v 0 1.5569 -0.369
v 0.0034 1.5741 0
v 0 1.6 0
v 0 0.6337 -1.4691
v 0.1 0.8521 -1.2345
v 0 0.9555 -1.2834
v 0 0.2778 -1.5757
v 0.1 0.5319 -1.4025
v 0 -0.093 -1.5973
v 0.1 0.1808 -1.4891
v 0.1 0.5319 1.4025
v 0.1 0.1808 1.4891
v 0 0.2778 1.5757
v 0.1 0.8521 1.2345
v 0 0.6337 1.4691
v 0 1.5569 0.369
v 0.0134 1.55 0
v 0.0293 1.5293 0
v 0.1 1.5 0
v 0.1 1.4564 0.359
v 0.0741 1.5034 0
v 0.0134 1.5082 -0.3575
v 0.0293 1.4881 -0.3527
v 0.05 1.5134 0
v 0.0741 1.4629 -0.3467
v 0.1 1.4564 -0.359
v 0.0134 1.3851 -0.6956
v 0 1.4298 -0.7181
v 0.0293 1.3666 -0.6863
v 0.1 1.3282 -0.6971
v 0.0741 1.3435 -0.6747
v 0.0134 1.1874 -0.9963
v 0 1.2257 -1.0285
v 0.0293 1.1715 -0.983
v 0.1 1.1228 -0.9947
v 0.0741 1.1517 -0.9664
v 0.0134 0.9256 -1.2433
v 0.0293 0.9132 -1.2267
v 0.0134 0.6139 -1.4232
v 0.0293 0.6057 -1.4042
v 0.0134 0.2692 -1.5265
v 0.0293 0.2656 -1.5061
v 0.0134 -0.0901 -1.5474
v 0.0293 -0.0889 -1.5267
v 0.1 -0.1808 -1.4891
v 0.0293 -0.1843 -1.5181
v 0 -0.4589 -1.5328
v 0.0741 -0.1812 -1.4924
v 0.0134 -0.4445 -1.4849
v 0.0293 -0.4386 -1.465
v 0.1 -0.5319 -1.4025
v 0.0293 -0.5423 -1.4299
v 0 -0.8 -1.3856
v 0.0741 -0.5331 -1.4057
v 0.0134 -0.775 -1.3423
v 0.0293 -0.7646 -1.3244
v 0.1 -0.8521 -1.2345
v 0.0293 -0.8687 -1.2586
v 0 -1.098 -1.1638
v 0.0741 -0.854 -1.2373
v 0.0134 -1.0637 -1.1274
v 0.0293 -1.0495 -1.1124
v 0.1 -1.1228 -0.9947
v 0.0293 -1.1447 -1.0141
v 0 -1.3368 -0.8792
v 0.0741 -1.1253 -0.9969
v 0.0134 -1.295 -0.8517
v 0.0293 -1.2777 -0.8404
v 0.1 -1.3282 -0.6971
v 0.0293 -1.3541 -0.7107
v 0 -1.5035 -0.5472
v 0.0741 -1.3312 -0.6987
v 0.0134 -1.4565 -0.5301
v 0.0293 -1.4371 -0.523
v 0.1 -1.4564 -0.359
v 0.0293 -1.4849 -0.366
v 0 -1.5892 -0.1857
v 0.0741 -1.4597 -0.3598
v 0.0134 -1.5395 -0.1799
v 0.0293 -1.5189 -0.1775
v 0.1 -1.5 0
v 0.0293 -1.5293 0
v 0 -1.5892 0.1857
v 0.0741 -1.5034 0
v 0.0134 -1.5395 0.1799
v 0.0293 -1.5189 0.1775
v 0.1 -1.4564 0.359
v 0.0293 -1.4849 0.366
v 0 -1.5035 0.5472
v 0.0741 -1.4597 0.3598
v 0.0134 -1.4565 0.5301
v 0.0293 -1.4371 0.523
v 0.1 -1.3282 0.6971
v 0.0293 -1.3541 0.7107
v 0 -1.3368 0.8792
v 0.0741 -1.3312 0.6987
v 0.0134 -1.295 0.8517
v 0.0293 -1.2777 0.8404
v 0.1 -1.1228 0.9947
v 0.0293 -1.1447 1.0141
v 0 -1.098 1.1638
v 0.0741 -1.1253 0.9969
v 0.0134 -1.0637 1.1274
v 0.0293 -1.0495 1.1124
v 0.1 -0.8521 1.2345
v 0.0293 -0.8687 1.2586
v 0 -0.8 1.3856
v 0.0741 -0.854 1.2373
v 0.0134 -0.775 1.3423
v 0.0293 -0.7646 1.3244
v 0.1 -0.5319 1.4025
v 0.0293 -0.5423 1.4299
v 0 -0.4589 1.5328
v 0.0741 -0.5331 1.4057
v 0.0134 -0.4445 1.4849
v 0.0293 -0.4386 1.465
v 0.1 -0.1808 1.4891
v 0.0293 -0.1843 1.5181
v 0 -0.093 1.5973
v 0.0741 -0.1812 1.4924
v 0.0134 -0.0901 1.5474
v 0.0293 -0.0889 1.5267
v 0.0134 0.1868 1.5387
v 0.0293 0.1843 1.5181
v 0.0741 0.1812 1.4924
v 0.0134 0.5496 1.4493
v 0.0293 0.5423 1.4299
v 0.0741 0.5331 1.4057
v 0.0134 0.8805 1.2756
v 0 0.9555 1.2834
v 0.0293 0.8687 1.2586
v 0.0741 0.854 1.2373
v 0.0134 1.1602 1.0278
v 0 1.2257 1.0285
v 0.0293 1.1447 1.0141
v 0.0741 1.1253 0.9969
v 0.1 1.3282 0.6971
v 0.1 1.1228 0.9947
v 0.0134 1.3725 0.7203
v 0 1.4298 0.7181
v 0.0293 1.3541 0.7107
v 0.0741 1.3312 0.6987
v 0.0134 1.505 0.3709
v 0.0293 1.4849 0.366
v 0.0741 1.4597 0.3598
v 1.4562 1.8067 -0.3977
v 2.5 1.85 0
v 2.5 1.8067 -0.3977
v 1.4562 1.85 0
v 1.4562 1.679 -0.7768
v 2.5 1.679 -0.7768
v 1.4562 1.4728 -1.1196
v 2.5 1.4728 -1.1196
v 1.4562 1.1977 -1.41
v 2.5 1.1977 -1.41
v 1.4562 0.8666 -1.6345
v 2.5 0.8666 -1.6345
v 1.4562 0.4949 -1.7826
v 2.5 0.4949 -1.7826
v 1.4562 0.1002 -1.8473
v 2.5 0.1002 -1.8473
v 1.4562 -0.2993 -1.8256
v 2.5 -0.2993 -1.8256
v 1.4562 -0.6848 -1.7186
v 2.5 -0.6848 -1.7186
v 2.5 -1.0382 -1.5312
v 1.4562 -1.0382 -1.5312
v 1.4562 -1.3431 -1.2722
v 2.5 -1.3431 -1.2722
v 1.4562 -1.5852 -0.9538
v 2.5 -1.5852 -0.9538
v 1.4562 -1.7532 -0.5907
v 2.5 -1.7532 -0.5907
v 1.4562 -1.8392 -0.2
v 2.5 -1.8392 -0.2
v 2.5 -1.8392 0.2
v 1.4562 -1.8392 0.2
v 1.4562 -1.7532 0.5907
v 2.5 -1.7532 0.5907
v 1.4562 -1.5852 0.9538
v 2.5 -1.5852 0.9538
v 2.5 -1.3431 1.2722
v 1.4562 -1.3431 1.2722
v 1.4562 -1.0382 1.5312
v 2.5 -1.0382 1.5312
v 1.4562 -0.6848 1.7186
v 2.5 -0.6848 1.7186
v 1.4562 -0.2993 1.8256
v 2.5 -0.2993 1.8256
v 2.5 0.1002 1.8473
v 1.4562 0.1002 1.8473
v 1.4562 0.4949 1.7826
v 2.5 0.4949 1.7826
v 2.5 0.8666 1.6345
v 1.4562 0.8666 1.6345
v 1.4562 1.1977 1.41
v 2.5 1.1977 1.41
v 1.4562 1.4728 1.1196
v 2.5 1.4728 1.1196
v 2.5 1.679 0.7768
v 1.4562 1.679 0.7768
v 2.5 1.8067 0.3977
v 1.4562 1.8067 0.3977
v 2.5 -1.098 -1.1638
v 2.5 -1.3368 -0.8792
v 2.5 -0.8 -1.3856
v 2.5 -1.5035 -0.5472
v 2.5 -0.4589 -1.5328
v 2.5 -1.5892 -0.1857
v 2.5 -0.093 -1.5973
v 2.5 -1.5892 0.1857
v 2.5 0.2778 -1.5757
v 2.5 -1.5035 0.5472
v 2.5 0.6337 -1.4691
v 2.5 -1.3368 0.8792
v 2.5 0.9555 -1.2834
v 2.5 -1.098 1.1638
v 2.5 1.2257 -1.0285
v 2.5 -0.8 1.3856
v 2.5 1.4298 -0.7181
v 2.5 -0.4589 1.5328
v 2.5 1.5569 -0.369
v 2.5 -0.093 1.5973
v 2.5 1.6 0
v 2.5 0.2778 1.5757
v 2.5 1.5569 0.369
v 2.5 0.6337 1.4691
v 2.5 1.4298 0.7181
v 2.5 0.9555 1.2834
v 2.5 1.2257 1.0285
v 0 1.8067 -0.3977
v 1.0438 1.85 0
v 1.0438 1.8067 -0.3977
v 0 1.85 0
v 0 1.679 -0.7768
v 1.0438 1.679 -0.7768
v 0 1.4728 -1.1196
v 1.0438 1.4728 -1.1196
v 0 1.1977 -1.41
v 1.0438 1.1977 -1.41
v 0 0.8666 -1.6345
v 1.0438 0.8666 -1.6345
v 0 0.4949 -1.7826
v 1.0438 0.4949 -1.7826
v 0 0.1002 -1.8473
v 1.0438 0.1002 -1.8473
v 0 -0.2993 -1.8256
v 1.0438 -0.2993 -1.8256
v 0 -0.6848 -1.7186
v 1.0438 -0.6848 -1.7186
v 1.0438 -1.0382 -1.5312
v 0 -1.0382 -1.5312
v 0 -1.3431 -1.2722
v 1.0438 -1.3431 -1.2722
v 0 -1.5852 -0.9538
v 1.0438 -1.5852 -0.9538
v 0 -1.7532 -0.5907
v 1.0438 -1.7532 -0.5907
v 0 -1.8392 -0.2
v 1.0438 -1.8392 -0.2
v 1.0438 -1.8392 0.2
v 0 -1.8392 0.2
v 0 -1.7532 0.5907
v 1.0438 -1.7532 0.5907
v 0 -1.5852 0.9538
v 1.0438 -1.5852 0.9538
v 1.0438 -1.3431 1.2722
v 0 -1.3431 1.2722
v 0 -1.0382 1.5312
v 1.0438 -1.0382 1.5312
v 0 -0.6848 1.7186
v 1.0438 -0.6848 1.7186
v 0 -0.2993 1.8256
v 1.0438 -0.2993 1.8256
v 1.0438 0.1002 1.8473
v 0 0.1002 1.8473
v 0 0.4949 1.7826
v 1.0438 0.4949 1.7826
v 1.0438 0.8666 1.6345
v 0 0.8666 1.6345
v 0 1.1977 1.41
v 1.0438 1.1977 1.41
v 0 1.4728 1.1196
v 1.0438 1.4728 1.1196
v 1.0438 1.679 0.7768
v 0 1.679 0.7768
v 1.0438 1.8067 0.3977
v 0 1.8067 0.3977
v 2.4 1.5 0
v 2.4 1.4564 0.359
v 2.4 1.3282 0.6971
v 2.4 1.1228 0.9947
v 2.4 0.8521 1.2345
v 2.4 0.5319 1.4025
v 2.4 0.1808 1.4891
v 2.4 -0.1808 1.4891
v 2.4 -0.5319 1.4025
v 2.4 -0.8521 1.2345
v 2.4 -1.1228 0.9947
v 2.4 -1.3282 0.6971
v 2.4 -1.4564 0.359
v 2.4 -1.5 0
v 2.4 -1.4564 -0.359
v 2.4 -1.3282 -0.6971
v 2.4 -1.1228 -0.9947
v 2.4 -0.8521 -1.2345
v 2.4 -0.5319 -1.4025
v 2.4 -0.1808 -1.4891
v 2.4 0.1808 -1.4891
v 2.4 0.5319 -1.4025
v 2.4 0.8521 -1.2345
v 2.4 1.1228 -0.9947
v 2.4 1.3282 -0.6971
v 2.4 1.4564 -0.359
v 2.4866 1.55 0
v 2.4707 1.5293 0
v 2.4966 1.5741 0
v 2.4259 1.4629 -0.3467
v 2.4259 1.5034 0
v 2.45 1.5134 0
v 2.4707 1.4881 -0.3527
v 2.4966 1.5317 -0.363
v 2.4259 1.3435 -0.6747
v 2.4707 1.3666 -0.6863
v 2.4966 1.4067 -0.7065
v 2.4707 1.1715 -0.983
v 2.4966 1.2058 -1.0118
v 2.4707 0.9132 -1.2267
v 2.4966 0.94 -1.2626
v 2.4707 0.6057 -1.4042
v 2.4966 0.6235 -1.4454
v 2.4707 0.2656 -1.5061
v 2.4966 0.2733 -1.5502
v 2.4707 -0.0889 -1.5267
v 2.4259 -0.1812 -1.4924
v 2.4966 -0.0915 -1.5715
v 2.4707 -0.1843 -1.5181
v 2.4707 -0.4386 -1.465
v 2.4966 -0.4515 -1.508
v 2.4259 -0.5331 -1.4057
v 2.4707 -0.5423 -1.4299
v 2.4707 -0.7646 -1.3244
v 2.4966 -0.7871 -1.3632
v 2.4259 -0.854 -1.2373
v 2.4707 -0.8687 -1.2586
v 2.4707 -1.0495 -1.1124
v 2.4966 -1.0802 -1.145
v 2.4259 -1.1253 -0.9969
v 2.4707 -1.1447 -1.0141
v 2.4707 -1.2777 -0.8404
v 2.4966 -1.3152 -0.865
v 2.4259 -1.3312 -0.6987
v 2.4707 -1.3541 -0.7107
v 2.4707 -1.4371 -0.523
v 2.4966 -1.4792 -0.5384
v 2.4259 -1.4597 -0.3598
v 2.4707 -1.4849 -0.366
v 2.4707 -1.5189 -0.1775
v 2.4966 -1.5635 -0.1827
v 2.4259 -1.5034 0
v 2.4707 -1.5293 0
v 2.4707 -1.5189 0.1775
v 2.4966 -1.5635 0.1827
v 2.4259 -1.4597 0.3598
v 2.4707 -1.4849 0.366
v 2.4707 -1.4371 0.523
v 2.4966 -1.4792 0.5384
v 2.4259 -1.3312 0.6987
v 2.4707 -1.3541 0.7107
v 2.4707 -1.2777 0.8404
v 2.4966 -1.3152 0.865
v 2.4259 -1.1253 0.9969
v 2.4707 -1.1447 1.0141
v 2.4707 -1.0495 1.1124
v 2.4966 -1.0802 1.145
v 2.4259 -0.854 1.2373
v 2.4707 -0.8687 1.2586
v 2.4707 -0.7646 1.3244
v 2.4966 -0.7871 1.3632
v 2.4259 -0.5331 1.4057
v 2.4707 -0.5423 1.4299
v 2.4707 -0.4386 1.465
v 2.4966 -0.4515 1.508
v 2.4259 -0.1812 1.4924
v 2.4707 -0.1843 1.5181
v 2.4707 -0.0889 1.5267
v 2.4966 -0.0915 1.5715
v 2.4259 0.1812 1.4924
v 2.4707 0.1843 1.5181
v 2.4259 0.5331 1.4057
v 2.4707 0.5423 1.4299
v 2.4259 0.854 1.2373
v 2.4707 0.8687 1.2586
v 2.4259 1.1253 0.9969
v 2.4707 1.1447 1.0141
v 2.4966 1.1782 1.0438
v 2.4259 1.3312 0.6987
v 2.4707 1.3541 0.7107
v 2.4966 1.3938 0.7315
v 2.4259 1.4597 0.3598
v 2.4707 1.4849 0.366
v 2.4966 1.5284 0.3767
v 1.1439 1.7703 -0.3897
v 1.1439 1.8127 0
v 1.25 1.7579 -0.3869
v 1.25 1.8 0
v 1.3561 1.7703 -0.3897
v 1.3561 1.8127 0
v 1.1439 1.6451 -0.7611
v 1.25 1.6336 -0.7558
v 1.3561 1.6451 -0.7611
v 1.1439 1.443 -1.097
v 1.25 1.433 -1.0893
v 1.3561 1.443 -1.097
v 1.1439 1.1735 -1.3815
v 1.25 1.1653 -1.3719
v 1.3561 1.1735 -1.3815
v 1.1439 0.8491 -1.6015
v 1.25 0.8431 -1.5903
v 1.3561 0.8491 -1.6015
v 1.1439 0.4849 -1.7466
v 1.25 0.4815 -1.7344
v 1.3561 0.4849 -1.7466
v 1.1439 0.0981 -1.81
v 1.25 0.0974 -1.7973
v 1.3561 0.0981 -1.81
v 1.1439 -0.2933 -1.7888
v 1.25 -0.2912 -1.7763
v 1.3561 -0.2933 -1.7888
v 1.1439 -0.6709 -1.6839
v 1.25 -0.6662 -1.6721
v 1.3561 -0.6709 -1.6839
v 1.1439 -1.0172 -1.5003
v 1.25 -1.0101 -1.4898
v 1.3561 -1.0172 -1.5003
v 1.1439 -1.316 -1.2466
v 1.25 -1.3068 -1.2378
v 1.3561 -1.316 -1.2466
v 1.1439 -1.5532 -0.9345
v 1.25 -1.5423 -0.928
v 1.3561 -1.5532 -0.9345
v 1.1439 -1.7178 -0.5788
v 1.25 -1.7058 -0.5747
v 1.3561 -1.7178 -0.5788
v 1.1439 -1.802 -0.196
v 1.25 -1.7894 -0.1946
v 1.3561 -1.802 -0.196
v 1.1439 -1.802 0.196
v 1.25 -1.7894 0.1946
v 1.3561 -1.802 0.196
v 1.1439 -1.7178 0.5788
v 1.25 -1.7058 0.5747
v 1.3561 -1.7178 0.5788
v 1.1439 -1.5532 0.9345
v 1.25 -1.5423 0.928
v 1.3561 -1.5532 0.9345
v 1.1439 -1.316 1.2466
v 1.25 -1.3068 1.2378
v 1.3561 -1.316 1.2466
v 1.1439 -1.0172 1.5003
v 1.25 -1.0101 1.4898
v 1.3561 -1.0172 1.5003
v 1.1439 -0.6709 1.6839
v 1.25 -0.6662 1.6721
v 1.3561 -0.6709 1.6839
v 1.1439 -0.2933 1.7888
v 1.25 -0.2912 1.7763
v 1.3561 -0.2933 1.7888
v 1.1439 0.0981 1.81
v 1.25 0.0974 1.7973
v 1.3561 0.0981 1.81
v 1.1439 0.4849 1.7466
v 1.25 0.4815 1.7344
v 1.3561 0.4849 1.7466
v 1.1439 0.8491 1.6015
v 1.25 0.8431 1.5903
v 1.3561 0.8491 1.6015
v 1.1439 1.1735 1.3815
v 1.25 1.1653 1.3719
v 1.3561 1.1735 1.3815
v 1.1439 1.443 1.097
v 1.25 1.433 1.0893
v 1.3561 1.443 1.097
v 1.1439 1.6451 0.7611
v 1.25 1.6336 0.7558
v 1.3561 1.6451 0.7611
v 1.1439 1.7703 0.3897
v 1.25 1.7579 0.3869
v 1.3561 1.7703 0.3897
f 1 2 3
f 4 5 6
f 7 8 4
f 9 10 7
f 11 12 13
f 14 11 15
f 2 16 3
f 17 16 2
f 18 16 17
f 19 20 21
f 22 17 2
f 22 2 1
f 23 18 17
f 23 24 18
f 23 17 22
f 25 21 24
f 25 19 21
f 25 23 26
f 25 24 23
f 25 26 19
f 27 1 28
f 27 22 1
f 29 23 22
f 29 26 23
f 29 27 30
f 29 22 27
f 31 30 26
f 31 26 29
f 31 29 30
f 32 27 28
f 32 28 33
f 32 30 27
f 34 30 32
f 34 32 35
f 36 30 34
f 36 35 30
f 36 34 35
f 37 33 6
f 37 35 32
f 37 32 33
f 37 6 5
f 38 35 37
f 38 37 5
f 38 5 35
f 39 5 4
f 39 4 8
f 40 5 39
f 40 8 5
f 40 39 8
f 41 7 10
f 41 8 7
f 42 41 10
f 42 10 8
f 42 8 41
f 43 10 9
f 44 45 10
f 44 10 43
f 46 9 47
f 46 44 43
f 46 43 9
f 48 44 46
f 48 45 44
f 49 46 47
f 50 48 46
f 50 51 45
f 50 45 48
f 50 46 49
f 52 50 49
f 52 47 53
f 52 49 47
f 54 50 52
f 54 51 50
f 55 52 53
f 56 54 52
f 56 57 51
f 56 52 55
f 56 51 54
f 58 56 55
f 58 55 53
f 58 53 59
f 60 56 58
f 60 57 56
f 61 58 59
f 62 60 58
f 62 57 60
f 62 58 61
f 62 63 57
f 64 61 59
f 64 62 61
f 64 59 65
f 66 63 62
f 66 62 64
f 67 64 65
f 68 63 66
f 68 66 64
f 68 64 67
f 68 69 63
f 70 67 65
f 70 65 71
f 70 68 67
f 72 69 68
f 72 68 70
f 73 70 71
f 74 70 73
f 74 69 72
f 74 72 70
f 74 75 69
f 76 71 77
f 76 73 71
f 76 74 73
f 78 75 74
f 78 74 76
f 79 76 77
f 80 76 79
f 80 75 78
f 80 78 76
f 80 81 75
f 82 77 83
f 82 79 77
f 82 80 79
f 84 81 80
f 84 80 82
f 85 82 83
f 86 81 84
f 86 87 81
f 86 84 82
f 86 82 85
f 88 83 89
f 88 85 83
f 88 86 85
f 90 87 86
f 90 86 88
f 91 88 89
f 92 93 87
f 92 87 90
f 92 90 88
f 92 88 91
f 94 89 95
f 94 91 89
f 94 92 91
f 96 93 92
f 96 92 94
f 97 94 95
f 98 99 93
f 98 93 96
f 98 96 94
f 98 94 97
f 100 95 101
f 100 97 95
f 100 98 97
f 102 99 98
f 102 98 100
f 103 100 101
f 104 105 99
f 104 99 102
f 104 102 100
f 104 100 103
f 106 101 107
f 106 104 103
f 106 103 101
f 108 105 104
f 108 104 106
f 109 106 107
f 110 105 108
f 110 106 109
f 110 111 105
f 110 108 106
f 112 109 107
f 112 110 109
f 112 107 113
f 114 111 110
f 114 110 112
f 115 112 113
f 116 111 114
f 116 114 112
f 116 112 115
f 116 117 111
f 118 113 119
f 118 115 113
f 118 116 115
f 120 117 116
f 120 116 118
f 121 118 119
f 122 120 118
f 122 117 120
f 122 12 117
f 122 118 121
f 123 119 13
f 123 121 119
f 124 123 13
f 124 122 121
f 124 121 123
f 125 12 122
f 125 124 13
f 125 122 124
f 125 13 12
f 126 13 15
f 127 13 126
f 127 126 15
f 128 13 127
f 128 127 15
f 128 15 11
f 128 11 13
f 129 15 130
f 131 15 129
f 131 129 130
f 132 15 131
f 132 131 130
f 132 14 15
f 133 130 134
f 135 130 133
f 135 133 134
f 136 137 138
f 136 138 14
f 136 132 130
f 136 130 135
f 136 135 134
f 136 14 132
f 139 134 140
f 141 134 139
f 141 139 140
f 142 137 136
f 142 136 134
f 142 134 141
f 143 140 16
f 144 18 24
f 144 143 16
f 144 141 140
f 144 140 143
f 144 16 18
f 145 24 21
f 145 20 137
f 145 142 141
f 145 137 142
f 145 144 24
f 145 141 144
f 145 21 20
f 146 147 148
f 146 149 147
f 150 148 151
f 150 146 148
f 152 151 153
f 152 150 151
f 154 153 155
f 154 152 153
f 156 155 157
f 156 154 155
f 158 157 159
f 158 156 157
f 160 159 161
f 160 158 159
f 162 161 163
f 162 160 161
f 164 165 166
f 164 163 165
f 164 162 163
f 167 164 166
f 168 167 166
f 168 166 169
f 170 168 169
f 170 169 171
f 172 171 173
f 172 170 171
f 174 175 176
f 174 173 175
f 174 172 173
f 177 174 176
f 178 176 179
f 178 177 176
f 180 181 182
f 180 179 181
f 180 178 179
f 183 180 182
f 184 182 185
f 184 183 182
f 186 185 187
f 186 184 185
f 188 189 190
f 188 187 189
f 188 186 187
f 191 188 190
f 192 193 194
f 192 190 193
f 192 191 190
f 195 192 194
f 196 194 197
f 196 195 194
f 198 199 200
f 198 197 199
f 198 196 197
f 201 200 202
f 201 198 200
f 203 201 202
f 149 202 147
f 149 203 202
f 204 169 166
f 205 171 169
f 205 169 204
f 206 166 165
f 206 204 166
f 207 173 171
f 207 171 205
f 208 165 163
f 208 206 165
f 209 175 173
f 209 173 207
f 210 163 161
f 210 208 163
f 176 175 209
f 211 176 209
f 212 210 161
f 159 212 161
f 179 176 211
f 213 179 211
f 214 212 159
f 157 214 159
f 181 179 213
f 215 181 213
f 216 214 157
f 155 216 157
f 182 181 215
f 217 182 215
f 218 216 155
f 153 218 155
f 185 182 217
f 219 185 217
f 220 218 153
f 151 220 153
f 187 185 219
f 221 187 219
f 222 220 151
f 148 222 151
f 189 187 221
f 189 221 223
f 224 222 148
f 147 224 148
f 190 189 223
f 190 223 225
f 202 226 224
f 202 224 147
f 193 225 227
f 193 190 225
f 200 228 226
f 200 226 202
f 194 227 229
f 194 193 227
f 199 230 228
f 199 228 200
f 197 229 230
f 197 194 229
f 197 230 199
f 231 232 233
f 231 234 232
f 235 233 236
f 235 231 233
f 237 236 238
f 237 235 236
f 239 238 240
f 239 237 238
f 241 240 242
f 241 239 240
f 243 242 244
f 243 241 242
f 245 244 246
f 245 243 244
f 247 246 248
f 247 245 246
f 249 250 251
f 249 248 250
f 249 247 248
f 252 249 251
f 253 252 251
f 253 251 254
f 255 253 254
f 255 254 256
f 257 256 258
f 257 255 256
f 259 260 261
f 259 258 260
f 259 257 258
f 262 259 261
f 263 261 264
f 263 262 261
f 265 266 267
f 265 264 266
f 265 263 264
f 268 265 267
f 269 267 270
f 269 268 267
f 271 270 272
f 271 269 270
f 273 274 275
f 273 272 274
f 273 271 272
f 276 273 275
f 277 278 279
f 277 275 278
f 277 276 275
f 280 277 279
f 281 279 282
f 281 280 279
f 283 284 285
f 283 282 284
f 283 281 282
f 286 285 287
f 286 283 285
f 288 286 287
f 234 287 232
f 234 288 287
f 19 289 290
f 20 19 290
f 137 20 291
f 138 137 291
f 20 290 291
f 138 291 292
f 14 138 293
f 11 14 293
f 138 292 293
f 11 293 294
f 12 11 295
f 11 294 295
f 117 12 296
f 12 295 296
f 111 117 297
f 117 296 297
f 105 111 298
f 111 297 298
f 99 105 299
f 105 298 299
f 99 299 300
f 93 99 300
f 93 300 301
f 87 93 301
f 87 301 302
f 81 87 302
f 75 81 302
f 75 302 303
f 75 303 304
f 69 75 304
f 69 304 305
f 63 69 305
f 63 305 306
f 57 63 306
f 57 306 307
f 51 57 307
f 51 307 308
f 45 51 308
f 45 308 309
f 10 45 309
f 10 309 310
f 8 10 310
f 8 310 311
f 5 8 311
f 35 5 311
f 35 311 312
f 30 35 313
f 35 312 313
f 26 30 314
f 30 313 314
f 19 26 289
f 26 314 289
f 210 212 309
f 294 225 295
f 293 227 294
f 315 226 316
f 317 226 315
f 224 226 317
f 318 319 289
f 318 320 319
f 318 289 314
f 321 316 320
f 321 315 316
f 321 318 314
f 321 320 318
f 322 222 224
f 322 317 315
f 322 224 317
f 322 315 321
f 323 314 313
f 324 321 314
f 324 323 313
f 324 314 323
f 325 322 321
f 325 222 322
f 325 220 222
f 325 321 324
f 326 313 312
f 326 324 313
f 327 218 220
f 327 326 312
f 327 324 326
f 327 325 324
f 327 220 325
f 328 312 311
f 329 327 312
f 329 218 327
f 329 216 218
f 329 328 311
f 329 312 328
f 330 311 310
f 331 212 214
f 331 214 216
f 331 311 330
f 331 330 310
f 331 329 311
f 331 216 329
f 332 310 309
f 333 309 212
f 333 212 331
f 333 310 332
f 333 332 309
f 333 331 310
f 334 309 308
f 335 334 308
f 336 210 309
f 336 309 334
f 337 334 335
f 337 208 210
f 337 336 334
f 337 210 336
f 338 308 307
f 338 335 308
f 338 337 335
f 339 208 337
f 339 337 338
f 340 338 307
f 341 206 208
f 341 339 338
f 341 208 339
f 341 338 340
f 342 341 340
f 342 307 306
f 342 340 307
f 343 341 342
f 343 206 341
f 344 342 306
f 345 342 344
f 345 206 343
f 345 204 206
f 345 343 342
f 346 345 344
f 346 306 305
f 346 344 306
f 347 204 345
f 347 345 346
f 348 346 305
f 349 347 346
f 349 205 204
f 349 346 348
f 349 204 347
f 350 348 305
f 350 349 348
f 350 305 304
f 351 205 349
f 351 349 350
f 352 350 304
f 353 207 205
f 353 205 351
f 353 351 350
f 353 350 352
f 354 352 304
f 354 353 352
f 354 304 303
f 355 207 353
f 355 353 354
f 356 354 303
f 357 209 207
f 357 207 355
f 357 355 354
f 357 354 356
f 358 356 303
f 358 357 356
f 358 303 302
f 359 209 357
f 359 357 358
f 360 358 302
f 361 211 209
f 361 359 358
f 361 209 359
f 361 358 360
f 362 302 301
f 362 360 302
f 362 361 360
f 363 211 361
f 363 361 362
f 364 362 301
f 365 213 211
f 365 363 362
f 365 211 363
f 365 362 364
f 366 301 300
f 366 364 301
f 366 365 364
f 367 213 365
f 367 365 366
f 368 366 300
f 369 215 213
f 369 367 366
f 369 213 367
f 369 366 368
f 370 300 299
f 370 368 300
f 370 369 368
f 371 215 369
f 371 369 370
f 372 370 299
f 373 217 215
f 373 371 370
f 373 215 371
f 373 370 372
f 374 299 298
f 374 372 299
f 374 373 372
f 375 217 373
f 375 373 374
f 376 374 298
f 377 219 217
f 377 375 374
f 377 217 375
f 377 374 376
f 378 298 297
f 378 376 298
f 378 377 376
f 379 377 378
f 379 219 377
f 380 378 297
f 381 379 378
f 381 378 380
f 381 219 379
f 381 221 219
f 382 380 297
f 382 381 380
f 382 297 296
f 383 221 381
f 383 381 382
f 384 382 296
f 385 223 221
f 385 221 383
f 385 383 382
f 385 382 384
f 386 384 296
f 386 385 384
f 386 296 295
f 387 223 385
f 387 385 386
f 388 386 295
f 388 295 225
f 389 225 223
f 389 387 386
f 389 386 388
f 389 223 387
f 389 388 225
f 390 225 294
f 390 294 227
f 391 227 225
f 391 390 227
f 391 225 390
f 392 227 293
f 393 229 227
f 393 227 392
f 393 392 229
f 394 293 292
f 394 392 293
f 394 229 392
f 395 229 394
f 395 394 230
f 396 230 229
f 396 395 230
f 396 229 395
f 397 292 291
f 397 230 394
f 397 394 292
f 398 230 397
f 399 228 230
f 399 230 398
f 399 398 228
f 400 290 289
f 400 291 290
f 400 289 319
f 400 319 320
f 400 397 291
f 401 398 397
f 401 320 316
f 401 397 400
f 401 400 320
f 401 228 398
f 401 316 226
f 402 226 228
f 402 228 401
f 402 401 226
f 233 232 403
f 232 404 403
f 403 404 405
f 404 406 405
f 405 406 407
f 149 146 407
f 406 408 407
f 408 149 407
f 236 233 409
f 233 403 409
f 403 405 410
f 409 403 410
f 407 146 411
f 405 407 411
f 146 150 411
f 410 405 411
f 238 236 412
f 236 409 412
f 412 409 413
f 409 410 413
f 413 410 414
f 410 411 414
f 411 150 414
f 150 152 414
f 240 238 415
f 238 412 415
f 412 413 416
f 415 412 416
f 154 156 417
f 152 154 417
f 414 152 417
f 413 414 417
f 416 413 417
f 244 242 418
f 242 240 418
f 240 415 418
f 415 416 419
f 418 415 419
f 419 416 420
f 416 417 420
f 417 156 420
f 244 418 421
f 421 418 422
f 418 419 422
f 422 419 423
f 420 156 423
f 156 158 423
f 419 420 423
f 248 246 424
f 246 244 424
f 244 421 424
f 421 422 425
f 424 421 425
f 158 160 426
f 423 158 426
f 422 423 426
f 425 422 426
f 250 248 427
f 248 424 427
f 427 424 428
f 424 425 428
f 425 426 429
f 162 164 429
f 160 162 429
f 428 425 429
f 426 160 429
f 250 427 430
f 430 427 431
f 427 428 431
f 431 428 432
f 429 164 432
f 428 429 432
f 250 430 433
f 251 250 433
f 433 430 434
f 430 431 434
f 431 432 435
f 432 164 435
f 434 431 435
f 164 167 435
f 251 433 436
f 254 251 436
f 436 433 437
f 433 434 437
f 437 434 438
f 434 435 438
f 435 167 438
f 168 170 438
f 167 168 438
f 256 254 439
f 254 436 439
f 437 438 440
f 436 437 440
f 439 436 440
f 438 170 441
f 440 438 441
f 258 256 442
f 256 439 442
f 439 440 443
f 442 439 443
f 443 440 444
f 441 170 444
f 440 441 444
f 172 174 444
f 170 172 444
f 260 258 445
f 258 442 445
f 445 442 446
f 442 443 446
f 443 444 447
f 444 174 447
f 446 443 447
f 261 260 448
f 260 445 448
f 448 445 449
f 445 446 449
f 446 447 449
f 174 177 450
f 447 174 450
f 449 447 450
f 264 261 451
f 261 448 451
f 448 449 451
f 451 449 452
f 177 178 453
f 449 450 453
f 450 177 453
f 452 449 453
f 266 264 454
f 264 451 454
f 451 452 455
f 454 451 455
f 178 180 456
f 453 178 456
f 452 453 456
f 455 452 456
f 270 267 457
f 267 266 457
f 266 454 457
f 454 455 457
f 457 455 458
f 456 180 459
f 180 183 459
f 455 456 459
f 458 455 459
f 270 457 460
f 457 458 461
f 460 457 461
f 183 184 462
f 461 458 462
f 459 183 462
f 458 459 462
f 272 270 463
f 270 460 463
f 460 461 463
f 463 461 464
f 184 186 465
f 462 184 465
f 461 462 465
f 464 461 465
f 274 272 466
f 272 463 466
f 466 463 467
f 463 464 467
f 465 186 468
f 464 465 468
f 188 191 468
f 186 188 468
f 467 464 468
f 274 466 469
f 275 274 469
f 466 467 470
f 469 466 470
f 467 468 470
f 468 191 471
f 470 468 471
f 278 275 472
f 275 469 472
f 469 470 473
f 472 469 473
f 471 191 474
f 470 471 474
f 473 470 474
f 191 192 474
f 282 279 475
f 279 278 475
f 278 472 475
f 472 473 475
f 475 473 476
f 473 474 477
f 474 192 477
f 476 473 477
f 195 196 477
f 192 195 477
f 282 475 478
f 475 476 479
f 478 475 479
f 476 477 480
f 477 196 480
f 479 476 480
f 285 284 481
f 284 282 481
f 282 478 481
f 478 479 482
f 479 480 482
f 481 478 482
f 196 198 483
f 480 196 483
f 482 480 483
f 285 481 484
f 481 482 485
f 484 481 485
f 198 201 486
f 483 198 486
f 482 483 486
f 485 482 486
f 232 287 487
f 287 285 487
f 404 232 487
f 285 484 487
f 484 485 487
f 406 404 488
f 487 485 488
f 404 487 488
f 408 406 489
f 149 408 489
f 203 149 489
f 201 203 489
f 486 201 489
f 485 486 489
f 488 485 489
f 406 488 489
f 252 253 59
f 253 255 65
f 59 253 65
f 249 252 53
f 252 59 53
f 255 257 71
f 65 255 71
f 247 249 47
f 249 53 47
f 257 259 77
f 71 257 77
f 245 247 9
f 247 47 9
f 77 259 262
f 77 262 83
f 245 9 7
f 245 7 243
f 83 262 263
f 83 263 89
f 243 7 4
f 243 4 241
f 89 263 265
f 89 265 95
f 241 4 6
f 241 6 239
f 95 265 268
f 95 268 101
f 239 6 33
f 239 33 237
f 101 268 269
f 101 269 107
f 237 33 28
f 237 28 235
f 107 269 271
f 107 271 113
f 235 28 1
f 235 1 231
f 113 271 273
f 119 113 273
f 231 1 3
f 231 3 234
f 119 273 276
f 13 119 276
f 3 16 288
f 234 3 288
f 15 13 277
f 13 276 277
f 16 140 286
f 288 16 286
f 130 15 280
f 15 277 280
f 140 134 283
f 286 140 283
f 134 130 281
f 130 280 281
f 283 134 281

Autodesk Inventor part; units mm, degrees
sketch "Sketch_1" plane through (0, 0, 0) normal (0, 0, 1) x (1, 0, 0)
  line L0 (2.5, 0) -> (0, 0)
  arc A0 (0, 1.6) -> (0.1, 1.5) centre (0.1, 1.6) ccw
  line L1 (0.1, 1.5) -> (2.4, 1.5)
  arc A1 (2.4, 1.5) -> (2.5, 1.6) centre (2.4, 1.6) ccw
  line L2 (2.5, 1.6) -> (2.5, 1.85)
  line L3 (2.5, 1.85) -> (1.4562, 1.85)
  arc A2 (1.0438, 1.85) -> (1.4562, 1.85) centre (1.25, 2.25) ccw
  line L4 (1.0438, 1.85) -> (0, 1.85)
  line L5 (0, 1.85) -> (0, 1.6)
revolve "Revolution1" add sketch "Sketch_1" angle 360 about axis through (2.5, 0, 0) along (1, 0, 0)
ref_plane "ip_st_1_1_XY" through (1.25, 2.25, 0) normal (1, 0, 0) x (0, 0, -1)
ref_plane "ip_st_1_1_YZ" through (1.25, 2.25, 0) normal (0, 0, -1) x (0, 1, 0)
ref_plane "ip_st_1_1_ZX" through (1.25, 2.25, 0) normal (0, 1, 0) x (1, 0, 0)
ref_plane "ip_st_1_10_XY" through (1.25, 0, -2.25) normal (1, 0, 0) x (0, 0, -1)
ref_plane "ip_st_1_10_YZ" through (1.25, 0, -2.25) normal (0, 0, -1) x (0, 1, 0)
ref_plane "ip_st_1_10_ZX" through (1.25, 0, -2.25) normal (0, 1, 0) x (1, 0, 0)
ref_plane "ip_st_1_11_XY" through (1.25, 1.125, -1.9486) normal (1, 0, 0) x (0, 0, -1)
ref_plane "ip_st_1_11_YZ" through (1.25, 1.125, -1.9486) normal (0, 0, -1) x (0, 1, 0)
ref_plane "ip_st_1_11_ZX" through (1.25, 1.125, -1.9486) normal (0, 1, 0) x (1, 0, 0)
ref_plane "ip_st_1_12_XY" through (1.25, 1.9486, -1.125) normal (1, 0, 0) x (0, 0, -1)
ref_plane "ip_st_1_12_YZ" through (1.25, 1.9486, -1.125) normal (0, 0, -1) x (0, 1, 0)
ref_plane "ip_st_1_12_ZX" through (1.25, 1.9486, -1.125) normal (0, 1, 0) x (1, 0, 0)
ref_plane "ip_st_1_2_XY" through (1.25, 1.9486, 1.125) normal (1, 0, 0) x (0, 0, -1)
ref_plane "ip_st_1_2_YZ" through (1.25, 1.9486, 1.125) normal (0, 0, -1) x (0, 1, 0)
ref_plane "ip_st_1_2_ZX" through (1.25, 1.9486, 1.125) normal (0, 1, 0) x (1, 0, 0)
ref_plane "ip_st_1_3_XY" through (1.25, 1.125, 1.9486) normal (1, 0, 0) x (0, 0, -1)
ref_plane "ip_st_1_3_YZ" through (1.25, 1.125, 1.9486) normal (0, 0, -1) x (0, 1, 0)
ref_plane "ip_st_1_3_ZX" through (1.25, 1.125, 1.9486) normal (0, 1, 0) x (1, 0, 0)
ref_plane "ip_st_1_4_XY" through (1.25, 0, 2.25) normal (1, 0, 0) x (0, 0, -1)
ref_plane "ip_st_1_4_YZ" through (1.25, 0, 2.25) normal (0, 0, -1) x (0, 1, 0)
ref_plane "ip_st_1_4_ZX" through (1.25, 0, 2.25) normal (0, 1, 0) x (1, 0, 0)
ref_plane "ip_st_1_5_XY" through (1.25, -1.125, 1.9486) normal (1, 0, 0) x (0, 0, -1)
ref_plane "ip_st_1_5_YZ" through (1.25, -1.125, 1.9486) normal (0, 0, -1) x (0, 1, 0)
ref_plane "ip_st_1_5_ZX" through (1.25, -1.125, 1.9486) normal (0, 1, 0) x (1, 0, 0)
ref_plane "ip_st_1_6_XY" through (1.25, -1.9486, 1.125) normal (1, 0, 0) x (0, 0, -1)
ref_plane "ip_st_1_6_YZ" through (1.25, -1.9486, 1.125) normal (0, 0, -1) x (0, 1, 0)
ref_plane "ip_st_1_6_ZX" through (1.25, -1.9486, 1.125) normal (0, 1, 0) x (1, 0, 0)
ref_plane "ip_st_1_7_XY" through (1.25, -2.25, 0) normal (1, 0, 0) x (0, 0, -1)
ref_plane "ip_st_1_7_YZ" through (1.25, -2.25, 0) normal (0, 0, -1) x (0, 1, 0)
ref_plane "ip_st_1_7_ZX" through (1.25, -2.25, 0) normal (0, 1, 0) x (1, 0, 0)
ref_plane "ip_st_1_8_XY" through (1.25, -1.9486, -1.125) normal (1, 0, 0) x (0, 0, -1)
ref_plane "ip_st_1_8_YZ" through (1.25, -1.9486, -1.125) normal (0, 0, -1) x (0, 1, 0)
ref_plane "ip_st_1_8_ZX" through (1.25, -1.9486, -1.125) normal (0, 1, 0) x (1, 0, 0)
ref_plane "ip_st_1_9_XY" through (1.25, -1.125, -1.9486) normal (1, 0, 0) x (0, 0, -1)
ref_plane "ip_st_1_9_YZ" through (1.25, -1.125, -1.9486) normal (0, 0, -1) x (0, 1, 0)
ref_plane "ip_st_1_9_ZX" through (1.25, -1.125, -1.9486) normal (0, 1, 0) x (1, 0, 0)
ref_plane "ip_st_1a_XY" through (0, 0, 0) normal (1, 0, 0) x (0, 0, -1)
ref_plane "ip_st_1a_YZ" through (0, 0, 0) normal (0, 0, -1) x (0, 1, 0)
ref_plane "ip_st_1a_ZX" through (0, 0, 0) normal (0, 1, 0) x (1, 0, 0)
ref_plane "ip_st_2a_XY" through (0.1562, 0, 0) normal (1, 0, 0) x (0, 0, -1)
ref_plane "ip_st_2a_YZ" through (0.1562, 0, 0) normal (0, 0, -1) x (0, 1, 0)
ref_plane "ip_st_2a_ZX" through (0.1562, 0, 0) normal (0, 1, 0) x (1, 0, 0)
properties part number "MF63ZZ Inner Ring"
